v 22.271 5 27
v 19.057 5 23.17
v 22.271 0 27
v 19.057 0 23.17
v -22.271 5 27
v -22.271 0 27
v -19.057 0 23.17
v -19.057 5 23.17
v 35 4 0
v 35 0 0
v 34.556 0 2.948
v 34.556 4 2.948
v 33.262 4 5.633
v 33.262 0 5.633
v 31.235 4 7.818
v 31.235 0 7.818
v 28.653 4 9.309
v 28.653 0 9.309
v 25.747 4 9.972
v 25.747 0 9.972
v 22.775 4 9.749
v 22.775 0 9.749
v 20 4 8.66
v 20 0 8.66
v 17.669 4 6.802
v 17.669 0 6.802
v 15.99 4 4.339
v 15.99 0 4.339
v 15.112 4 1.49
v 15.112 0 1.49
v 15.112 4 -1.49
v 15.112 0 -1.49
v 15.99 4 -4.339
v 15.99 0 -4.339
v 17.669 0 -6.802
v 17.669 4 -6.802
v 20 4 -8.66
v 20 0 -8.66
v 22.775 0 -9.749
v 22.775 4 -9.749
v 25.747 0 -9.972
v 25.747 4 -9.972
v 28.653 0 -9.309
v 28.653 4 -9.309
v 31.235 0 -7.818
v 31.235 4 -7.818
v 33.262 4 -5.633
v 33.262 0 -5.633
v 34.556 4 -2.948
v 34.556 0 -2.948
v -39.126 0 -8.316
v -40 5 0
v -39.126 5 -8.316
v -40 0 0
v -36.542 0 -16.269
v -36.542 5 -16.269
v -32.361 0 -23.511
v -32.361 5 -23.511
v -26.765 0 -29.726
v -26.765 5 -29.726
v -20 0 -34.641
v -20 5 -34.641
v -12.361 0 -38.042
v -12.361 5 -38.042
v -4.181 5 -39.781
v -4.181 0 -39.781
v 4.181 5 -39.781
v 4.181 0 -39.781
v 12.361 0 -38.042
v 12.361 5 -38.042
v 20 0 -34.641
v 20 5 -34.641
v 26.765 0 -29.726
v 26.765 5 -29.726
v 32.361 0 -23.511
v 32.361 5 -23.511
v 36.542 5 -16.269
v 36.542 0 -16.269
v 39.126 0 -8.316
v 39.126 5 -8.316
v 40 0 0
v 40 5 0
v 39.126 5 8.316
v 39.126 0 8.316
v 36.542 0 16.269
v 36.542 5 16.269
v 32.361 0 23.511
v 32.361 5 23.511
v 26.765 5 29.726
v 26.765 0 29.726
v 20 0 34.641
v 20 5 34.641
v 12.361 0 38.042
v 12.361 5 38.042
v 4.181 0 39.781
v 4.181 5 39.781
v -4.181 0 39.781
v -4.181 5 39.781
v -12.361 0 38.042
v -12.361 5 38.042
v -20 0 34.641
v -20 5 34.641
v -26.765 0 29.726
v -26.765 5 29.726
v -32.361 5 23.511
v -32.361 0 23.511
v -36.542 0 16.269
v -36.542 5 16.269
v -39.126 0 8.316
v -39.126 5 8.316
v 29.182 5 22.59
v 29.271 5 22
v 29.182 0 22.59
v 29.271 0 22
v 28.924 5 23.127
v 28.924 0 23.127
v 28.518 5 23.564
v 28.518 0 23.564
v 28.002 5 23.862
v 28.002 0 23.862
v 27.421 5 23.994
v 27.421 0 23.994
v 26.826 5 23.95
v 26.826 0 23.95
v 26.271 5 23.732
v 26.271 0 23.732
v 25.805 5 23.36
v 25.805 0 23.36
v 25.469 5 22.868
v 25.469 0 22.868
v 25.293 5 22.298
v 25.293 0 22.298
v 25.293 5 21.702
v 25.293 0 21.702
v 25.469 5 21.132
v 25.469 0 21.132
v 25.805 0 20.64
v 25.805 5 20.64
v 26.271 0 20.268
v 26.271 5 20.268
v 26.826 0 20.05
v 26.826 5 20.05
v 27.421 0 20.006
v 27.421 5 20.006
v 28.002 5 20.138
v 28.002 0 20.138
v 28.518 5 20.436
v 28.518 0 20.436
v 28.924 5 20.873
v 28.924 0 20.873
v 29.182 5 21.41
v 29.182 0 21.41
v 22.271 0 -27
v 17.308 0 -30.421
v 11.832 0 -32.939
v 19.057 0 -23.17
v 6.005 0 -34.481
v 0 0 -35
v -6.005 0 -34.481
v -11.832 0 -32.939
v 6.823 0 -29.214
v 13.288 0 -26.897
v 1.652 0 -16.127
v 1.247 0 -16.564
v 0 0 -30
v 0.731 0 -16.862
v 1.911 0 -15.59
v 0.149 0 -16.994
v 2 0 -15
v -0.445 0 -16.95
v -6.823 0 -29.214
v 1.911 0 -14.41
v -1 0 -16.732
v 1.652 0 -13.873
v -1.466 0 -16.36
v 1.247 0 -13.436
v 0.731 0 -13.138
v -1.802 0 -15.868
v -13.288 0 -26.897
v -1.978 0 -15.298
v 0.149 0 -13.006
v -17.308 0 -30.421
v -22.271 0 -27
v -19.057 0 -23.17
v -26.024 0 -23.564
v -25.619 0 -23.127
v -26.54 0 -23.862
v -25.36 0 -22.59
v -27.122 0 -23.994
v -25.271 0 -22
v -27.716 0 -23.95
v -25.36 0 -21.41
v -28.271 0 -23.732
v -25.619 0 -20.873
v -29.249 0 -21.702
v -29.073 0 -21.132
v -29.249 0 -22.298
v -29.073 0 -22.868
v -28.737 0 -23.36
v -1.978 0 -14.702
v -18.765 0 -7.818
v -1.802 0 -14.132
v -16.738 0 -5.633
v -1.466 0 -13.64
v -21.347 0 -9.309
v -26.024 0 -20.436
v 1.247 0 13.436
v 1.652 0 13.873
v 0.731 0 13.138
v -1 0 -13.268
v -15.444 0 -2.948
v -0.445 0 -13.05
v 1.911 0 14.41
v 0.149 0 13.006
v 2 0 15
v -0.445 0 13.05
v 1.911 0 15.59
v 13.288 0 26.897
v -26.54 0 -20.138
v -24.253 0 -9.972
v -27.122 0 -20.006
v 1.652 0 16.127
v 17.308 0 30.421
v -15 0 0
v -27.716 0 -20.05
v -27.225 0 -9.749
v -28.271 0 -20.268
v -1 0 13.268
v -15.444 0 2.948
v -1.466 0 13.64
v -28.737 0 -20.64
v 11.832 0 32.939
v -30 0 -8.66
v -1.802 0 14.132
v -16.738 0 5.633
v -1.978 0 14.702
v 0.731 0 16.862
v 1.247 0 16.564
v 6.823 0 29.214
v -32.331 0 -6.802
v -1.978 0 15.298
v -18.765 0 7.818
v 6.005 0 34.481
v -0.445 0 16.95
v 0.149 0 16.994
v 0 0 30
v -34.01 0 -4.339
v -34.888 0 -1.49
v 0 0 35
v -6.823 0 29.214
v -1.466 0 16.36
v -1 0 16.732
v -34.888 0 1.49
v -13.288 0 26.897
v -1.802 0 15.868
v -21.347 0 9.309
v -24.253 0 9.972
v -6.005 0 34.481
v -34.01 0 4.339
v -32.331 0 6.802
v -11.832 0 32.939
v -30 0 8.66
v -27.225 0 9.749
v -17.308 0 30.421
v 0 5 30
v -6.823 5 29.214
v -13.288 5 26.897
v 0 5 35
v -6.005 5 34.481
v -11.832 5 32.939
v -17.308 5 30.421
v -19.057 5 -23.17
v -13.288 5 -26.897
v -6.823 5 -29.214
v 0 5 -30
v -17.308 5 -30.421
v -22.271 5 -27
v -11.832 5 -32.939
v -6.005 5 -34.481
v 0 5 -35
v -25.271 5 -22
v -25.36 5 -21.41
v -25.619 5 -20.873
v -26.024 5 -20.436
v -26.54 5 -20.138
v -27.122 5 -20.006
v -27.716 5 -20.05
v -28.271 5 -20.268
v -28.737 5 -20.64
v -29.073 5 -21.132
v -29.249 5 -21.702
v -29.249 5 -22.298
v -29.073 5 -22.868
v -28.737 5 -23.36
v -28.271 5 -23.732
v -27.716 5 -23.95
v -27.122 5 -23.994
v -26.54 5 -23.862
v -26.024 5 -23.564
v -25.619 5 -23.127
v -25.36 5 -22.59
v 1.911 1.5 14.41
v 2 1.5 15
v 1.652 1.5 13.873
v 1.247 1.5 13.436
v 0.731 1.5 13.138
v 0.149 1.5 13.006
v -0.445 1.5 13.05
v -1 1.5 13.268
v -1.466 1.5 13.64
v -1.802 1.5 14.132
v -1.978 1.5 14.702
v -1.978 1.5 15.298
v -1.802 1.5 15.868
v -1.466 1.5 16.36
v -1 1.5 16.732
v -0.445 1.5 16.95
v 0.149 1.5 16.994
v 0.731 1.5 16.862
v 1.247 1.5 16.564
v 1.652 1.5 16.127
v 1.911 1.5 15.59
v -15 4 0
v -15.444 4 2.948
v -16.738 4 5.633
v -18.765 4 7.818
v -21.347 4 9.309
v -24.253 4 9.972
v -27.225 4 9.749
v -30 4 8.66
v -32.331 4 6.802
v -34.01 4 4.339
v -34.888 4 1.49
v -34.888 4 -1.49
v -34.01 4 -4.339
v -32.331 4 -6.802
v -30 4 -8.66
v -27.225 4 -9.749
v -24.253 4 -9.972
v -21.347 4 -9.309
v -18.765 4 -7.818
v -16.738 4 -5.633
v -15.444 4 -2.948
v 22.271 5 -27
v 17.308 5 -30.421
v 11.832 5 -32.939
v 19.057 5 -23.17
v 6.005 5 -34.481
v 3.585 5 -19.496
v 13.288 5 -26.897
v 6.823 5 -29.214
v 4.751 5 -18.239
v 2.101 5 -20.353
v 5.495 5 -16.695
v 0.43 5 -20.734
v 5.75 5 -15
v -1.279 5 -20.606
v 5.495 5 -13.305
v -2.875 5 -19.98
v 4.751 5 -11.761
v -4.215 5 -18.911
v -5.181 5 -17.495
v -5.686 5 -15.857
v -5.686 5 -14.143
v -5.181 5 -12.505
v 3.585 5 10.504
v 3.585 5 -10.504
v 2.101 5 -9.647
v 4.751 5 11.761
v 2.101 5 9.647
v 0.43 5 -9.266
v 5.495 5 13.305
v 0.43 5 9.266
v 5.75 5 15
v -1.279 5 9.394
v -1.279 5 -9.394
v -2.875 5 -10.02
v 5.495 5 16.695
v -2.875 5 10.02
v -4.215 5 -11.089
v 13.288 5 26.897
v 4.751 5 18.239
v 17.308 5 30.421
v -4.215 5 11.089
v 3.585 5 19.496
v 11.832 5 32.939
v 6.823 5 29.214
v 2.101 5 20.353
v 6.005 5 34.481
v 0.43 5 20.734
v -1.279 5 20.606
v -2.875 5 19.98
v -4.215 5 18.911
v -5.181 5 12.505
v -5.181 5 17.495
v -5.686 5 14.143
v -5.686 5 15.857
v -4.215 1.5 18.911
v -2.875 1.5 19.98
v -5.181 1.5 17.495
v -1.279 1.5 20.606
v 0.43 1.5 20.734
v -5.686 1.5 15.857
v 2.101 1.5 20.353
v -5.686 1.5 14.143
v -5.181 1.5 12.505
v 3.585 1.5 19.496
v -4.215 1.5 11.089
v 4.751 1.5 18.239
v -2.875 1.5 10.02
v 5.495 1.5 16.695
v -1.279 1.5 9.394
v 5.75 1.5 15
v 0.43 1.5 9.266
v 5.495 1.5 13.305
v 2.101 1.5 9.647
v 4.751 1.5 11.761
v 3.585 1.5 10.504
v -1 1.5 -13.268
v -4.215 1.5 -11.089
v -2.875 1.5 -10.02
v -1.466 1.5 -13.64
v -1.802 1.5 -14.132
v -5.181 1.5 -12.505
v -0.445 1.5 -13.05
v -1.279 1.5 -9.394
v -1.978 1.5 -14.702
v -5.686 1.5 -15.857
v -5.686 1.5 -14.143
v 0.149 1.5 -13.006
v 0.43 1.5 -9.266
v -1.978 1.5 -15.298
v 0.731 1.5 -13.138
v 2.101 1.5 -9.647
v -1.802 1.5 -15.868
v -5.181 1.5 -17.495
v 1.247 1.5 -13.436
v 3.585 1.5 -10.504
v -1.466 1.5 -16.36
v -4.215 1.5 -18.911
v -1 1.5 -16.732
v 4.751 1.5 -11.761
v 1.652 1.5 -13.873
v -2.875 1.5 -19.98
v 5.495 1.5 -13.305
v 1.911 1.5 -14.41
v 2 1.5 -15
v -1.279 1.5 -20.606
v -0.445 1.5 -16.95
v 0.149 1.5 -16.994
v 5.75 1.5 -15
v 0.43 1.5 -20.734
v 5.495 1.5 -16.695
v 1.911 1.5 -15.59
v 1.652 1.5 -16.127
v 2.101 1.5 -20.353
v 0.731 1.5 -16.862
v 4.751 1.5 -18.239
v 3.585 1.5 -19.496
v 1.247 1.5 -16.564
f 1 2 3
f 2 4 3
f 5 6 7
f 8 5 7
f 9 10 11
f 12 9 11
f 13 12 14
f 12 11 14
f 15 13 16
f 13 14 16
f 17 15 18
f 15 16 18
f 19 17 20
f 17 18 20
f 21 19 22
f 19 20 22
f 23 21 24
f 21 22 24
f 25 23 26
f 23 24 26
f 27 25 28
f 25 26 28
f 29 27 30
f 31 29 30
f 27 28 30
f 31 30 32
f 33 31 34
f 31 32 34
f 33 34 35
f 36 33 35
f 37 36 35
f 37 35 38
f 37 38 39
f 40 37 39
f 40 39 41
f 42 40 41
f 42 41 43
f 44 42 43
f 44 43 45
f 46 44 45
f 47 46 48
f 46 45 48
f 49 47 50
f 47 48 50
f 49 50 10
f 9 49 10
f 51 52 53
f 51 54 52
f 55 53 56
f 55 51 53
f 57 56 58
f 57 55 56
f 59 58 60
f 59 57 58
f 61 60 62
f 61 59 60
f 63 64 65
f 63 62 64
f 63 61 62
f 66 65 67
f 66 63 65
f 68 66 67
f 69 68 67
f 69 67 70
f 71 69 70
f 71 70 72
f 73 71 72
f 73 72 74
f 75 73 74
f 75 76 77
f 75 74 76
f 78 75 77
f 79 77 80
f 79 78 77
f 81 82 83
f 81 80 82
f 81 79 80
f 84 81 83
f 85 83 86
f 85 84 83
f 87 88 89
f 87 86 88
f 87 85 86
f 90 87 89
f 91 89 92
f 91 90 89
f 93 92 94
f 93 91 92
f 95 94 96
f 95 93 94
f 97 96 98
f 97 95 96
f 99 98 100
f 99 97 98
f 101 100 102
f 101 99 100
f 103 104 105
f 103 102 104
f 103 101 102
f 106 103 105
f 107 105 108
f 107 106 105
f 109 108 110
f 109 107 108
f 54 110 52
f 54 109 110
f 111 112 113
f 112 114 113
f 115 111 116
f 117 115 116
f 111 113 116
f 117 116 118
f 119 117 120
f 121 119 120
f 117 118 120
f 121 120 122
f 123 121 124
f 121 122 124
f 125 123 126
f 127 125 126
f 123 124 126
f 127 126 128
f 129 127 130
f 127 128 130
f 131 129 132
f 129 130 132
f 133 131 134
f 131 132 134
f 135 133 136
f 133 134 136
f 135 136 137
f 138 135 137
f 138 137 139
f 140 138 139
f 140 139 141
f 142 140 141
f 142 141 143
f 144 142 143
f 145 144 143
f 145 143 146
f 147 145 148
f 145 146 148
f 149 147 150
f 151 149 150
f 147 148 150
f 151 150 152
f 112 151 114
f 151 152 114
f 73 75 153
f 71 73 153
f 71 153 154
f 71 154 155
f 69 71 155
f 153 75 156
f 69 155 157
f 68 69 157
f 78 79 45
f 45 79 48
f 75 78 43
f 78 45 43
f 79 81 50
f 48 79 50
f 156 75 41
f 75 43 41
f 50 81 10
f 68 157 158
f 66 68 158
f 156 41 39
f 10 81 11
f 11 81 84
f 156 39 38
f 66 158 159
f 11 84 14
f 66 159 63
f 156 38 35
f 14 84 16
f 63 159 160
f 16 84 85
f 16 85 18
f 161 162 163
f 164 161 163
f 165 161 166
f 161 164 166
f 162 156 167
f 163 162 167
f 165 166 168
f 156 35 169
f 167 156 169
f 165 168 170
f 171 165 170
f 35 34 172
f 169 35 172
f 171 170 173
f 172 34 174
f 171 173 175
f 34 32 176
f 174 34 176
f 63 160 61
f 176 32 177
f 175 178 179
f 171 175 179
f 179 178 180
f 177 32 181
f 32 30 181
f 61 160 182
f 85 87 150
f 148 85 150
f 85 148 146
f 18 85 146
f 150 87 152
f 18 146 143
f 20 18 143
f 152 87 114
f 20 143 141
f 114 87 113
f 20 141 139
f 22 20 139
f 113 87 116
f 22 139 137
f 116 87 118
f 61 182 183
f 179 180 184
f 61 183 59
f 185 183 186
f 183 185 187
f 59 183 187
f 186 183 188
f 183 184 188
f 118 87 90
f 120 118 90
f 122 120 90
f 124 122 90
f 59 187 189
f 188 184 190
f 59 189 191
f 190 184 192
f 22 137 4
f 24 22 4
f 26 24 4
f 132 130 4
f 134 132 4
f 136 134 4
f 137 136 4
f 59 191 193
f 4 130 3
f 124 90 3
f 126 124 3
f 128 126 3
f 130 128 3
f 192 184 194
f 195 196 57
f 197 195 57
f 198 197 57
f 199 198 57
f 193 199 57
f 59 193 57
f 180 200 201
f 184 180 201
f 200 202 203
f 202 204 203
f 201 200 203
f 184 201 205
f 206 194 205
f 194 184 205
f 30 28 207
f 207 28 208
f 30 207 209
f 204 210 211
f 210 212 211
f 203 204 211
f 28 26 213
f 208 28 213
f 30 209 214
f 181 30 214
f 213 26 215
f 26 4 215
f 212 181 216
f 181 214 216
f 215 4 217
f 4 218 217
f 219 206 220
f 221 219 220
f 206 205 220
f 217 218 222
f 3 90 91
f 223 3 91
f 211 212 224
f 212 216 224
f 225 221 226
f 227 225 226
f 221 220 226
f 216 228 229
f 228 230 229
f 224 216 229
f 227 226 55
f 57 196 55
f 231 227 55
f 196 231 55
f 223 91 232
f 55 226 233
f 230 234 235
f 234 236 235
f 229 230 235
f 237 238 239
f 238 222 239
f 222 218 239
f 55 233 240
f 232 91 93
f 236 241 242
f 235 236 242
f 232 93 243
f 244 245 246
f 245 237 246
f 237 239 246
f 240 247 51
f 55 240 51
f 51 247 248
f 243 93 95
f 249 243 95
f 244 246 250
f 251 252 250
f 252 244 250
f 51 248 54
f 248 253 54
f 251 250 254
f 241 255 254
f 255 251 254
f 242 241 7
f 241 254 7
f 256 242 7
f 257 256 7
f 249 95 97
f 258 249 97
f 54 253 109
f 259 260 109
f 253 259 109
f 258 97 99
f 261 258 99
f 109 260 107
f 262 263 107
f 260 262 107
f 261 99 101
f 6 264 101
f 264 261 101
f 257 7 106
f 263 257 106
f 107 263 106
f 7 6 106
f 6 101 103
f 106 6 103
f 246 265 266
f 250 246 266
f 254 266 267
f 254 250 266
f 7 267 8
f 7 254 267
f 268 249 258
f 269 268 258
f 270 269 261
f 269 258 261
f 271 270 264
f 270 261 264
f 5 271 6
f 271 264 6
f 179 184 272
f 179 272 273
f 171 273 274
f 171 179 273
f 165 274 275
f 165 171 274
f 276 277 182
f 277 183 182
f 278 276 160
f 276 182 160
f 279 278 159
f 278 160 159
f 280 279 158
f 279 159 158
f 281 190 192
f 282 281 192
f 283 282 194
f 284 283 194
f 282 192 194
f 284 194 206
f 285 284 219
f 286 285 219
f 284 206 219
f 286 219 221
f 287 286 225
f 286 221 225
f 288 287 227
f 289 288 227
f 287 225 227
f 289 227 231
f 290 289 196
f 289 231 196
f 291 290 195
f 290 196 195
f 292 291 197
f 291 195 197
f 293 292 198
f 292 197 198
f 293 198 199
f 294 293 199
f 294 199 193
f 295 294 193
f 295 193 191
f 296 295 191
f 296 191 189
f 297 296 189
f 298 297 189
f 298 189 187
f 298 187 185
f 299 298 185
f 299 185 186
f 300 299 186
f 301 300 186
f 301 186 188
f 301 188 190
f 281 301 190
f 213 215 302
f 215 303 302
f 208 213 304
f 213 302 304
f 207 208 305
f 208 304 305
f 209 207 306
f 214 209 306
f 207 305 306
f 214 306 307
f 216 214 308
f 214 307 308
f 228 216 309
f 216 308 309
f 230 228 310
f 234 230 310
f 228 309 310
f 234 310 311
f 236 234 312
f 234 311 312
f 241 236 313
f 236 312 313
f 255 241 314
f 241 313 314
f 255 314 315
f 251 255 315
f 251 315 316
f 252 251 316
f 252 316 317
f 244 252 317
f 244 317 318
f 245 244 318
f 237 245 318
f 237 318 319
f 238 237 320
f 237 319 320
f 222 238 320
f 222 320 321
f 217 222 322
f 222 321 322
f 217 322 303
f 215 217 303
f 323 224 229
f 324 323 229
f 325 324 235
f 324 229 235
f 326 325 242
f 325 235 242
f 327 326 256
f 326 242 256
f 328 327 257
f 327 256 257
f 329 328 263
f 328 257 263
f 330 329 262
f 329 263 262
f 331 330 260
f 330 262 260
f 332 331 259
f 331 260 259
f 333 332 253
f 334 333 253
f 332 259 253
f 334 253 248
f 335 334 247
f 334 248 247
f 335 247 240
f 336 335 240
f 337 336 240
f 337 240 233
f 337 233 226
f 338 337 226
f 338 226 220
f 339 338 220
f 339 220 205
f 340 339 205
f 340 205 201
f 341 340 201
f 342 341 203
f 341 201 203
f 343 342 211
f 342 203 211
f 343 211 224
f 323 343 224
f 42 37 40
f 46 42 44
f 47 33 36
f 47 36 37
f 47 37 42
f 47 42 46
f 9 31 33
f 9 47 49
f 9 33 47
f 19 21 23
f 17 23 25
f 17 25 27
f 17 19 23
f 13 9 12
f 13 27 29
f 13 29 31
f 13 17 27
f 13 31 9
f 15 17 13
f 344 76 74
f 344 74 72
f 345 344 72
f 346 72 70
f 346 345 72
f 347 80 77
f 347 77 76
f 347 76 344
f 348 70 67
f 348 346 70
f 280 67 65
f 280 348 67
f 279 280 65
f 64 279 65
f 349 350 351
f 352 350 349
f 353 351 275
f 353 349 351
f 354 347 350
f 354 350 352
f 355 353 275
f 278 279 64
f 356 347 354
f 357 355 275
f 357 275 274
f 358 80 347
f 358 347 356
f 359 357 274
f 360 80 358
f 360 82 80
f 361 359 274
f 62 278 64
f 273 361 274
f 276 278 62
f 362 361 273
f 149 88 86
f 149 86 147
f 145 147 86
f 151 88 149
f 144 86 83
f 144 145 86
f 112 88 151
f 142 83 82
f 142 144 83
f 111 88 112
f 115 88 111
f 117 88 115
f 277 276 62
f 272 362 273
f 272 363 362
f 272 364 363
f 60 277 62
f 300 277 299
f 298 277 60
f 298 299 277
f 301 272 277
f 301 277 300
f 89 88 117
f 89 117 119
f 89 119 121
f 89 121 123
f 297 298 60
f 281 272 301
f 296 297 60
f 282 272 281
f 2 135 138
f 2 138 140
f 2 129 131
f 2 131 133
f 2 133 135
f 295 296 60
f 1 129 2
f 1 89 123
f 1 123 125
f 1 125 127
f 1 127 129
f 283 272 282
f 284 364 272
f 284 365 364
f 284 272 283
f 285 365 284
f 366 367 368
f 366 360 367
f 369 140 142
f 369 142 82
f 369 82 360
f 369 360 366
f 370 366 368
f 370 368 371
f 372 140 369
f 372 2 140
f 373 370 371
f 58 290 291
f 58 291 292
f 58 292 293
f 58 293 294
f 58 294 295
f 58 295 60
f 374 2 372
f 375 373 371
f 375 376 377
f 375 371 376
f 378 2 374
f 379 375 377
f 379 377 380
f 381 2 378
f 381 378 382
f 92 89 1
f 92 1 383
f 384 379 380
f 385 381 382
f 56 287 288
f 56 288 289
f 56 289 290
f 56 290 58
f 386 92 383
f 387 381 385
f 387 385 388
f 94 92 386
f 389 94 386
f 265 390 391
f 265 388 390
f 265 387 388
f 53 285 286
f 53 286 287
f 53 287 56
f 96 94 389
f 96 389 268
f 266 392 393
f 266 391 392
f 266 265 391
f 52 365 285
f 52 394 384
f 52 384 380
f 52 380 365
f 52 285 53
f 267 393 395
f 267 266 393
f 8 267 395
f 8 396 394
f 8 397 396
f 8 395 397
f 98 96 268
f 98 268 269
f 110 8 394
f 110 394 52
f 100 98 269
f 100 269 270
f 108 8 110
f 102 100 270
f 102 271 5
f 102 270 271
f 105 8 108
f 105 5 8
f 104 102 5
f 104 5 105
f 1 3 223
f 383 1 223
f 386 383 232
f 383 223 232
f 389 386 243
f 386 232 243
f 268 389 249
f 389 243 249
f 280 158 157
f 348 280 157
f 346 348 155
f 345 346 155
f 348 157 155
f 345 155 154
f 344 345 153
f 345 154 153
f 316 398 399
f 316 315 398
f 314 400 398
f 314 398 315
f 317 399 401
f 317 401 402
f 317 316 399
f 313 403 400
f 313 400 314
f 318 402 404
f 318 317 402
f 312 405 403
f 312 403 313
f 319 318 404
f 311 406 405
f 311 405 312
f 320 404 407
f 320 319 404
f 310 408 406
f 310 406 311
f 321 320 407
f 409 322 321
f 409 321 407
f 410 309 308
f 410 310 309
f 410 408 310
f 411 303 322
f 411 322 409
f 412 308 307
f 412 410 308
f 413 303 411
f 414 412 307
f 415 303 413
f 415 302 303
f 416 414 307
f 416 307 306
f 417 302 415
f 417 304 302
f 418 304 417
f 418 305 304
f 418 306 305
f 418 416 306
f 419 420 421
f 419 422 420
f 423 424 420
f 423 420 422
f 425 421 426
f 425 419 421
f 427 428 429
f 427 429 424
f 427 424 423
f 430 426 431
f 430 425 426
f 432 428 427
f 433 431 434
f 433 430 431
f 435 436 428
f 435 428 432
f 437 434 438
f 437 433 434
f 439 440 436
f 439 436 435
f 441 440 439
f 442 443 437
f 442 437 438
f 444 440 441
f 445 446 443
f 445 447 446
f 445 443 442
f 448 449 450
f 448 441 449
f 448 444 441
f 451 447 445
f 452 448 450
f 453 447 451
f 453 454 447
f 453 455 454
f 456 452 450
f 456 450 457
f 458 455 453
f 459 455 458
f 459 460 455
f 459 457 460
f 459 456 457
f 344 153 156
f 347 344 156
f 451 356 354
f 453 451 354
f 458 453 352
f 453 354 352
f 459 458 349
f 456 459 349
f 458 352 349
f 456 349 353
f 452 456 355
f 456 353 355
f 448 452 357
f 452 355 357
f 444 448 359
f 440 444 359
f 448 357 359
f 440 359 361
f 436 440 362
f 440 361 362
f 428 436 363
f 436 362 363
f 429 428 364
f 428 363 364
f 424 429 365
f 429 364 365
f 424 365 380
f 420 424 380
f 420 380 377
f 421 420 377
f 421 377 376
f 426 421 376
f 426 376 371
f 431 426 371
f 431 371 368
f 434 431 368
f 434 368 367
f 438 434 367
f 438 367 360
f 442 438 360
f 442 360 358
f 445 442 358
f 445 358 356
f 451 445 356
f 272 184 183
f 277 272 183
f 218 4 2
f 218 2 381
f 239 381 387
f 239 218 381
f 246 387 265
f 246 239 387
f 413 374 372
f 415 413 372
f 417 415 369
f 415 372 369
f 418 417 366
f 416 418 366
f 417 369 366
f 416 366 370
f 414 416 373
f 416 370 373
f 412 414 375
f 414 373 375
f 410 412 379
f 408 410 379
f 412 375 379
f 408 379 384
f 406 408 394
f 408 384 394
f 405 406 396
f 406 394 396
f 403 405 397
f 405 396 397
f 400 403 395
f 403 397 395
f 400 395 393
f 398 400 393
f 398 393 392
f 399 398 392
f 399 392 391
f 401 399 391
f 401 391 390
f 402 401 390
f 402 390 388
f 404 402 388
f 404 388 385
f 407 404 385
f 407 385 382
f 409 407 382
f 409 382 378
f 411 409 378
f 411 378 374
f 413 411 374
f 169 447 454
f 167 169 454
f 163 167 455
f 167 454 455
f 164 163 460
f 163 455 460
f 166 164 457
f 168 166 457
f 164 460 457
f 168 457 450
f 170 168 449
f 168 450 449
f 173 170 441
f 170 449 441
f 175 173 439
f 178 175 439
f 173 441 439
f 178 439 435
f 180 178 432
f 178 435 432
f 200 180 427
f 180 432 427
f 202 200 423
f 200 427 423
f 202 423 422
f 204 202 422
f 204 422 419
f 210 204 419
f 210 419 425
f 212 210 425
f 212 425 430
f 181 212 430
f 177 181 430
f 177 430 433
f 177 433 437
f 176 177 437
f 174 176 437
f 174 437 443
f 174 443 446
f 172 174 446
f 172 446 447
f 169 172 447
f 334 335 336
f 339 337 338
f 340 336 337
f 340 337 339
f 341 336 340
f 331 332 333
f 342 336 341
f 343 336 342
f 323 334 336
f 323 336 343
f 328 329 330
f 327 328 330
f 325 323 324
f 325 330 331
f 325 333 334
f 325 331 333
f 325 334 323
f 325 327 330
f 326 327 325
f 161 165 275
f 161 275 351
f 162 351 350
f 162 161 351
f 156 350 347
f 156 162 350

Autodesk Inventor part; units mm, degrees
ref_plane "YZ Plane" through (0, 0, 0) normal (1, 0, 0) x (0, 1, 0)
ref_plane "XZ Plane" through (0, 0, 0) normal (0, 1, 0) x (-1, 0, 0)
sketch "Sketch1" plane through (0, 0, 0) normal (0, 1, 0) x (-1, 0, 0)
  circle A0 centre (0, 0) radius 40
  dimension "d0" = 80
sketch "Sketch1 outline for Extrusion1" plane through (0, 0, 0) normal (0, 1, 0) x (-1, 0, 0)
  circle A0 centre (0, 0) radius 40
extrude "Extrusion1" add sketch "Sketch1 outline for Extrusion1" along normal blind 5
sketch "Sketch6" plane through (0, 0, 0) normal (0, -1, 0) x (1, 0, 0)
  line L0 (0, 0) -> (25, 0)
  circle A0 centre (25, 0) radius 10
  line L1 (0, 0) -> (-25, 0)
  line L2 (0, 0) -> (25, 0) construction
  circle A1 centre (-25, 0) radius 10
  dimension "d19" = 25
  dimension "d20" = 20
  dimension "d46" = 25
  dimension "d47" = 180
  dimension "d48" = 20
sketch "Sketch6 outline for Extrusion5" plane through (0, 0, 0) normal (0, -1, 0) x (1, 0, 0)
  circle A0 centre (25, 0) radius 10
  circle A1 centre (-25, 0) radius 10
extrude "Extrusion5" cut sketch "Sketch6 outline for Extrusion5" against normal blind 4
sketch "Sketch8" plane through (0, 0, 0) normal (0, -1, 0) x (1, 0, 0)
  circle A0 centre (0, 0) radius 40
  line L0 (21.650635, 27.5) -> (26.777009, 27.5) construction
  line L1 (0, 40) -> (0, 35)
  circle A1 centre (0, 0) radius 35
  line L2 (0, 35) -> (0, 30)
  circle A2 centre (0, 0) radius 30
  line L3 (0, 30) -> (26.457513, 30)
  line L4 (18.027756, 30) -> (15.52731, 25.669099)
  line L5 (18.027756, 30) -> (23.02865, 30) construction
  line L6 (-40, 0) -> (40, 0)
  line L7 (0, -30) -> (0, -40)
  line L8 (0, 30) -> (0, 27)
  line L9 (0, 27) -> (29.512709, 27)
  line L10 (22.271057, 27) -> (27.352779, 27) construction
  line L11 (22.271057, 27) -> (19.056987, 23.169619)
  line L12 (22.271057, 27) -> (27.271264, 27) construction
  line L13 (22.271057, -27) -> (19.056987, -23.169619)
  point P0 (0, -35)
  dimension "d53" = 5
  dimension "d54" = 5
  dimension "d55" = 120
  dimension "d58" = 3
  dimension "d60" = 130
sketch "Sketch8 outline for Extrusion7" plane through (0, 0, 0) normal (0, -1, 0) x (1, 0, 0)
  line L0 (22.271057, -27) -> (19.056987, -23.169619)
  arc A0 (0, -35) -> (22.271057, -27) centre (0, 0) ccw
  line L1 (0, -30) -> (0, -35)
  arc A1 (19.056987, -23.169619) -> (0, -30) centre (0, 0) cw
  line L2 (19.056987, 23.169619) -> (22.271057, 27)
  arc A2 (0, 30) -> (19.056987, 23.169619) centre (0, 0) cw
  line L3 (0, 35) -> (0, 30)
  arc A3 (22.271057, 27) -> (0, 35) centre (0, 0) ccw
extrude "Extrusion7" cut sketch "Sketch8 outline for Extrusion7" against normal up to surface (5 mm away)
ref_plane "Work Plane1" through (0, 0, -32.5) normal (1, 0, 0) x (0, 0, -1)
mirror "Mirror1" about plane through (0, 0, -32.5) normal (1, 0, 0) of "Extrusion7"
sketch "Sketch9" plane through (0, 5, 0) normal (0, 1, 0) x (1, 0, 0)
  circle A0 centre (25, 0) radius 10
  circle A1 centre (-25, 0) radius 10
  arc A2 (-19.056987, -23.169619) -> (19.056987, -23.169619) centre (0, 0) ccw
  line L0 (0, 0) -> (0, -30)
  line L1 (0, 0) -> (0, 30)
  arc A3 (19.056987, 23.169619) -> (-19.056987, 23.169619) centre (0, 0) ccw
  line L2 (0, 0) -> (0, -15)
  circle A4 centre (0, -15) radius 5.75
  line L3 (0, 0) -> (0, 15)
  circle A5 centre (0, 15) radius 5.75
  dimension "d61" = 15
  dimension "d62" = 11.5
  dimension "d63" = 15
  dimension "d64" = 11.5
sketch "Sketch9 outline for Extrusion8" plane through (0, 5, 0) normal (0, 1, 0) x (1, 0, 0)
  circle A0 centre (0, 15) radius 5.75
  circle A1 centre (0, -15) radius 5.75
extrude "Extrusion8" cut sketch "Sketch9 outline for Extrusion8" against normal blind 3.5
sketch "Sketch10" plane through (0, 1.5, 15) normal (0, 1, 0) x (1, 0, 0)
  circle A0 centre (0, 30) radius 5.75 projected
  circle A1 centre (0, 30) radius 2
  circle A2 centre (0, 0) radius 5.75 projected
  circle A3 centre (0, 0) radius 2
  point P0 (0, 15)
  dimension "d68" = 4
  dimension "d69" = 4
sketch "Sketch10 outline for Extrusion9" plane through (0, 1.5, 15) normal (0, 1, 0) x (1, 0, 0)
  circle A0 centre (0, 0) radius 2
  circle A1 centre (0, 30) radius 2
extrude "Extrusion9" cut sketch "Sketch10 outline for Extrusion9" against normal up to surface (1.5 mm away)
sketch "Sketch11" plane through (0, 0, 0) normal (0, -1, 0) x (1, 0, 0)
  line L0 (22.271057, 27) -> (19.056987, 23.169619)
  line L1 (22.271057, 27) -> (22.271057, 22)
  line L2 (22.271057, 22) -> (27.271057, 22)
  circle A0 centre (27.271057, 22) radius 2
  arc A1 (-22.271057, -27) -> (22.271057, -27) centre (0, 0) ccw
  line L3 (-22.271057, -27) -> (-22.271057, -22)
  line L4 (-22.271057, -22) -> (-27.271057, -22)
  circle A2 centre (-27.271057, -22) radius 2
  dimension "d72" = 5
  dimension "d73" = 5
  dimension "d74" = 4
  dimension "d75" = 5
  dimension "d76" = 5
  dimension "d77" = 4
sketch "Sketch11 outline for Extrusion10" plane through (0, 0, 0) normal (0, -1, 0) x (1, 0, 0)
  circle A0 centre (27.271057, 22) radius 2
  circle A1 centre (-27.271057, -22) radius 2
extrude "Extrusion10" cut sketch "Sketch11 outline for Extrusion10" against normal up to surface (5 mm away)
properties part number "Wrist_Coupling"
